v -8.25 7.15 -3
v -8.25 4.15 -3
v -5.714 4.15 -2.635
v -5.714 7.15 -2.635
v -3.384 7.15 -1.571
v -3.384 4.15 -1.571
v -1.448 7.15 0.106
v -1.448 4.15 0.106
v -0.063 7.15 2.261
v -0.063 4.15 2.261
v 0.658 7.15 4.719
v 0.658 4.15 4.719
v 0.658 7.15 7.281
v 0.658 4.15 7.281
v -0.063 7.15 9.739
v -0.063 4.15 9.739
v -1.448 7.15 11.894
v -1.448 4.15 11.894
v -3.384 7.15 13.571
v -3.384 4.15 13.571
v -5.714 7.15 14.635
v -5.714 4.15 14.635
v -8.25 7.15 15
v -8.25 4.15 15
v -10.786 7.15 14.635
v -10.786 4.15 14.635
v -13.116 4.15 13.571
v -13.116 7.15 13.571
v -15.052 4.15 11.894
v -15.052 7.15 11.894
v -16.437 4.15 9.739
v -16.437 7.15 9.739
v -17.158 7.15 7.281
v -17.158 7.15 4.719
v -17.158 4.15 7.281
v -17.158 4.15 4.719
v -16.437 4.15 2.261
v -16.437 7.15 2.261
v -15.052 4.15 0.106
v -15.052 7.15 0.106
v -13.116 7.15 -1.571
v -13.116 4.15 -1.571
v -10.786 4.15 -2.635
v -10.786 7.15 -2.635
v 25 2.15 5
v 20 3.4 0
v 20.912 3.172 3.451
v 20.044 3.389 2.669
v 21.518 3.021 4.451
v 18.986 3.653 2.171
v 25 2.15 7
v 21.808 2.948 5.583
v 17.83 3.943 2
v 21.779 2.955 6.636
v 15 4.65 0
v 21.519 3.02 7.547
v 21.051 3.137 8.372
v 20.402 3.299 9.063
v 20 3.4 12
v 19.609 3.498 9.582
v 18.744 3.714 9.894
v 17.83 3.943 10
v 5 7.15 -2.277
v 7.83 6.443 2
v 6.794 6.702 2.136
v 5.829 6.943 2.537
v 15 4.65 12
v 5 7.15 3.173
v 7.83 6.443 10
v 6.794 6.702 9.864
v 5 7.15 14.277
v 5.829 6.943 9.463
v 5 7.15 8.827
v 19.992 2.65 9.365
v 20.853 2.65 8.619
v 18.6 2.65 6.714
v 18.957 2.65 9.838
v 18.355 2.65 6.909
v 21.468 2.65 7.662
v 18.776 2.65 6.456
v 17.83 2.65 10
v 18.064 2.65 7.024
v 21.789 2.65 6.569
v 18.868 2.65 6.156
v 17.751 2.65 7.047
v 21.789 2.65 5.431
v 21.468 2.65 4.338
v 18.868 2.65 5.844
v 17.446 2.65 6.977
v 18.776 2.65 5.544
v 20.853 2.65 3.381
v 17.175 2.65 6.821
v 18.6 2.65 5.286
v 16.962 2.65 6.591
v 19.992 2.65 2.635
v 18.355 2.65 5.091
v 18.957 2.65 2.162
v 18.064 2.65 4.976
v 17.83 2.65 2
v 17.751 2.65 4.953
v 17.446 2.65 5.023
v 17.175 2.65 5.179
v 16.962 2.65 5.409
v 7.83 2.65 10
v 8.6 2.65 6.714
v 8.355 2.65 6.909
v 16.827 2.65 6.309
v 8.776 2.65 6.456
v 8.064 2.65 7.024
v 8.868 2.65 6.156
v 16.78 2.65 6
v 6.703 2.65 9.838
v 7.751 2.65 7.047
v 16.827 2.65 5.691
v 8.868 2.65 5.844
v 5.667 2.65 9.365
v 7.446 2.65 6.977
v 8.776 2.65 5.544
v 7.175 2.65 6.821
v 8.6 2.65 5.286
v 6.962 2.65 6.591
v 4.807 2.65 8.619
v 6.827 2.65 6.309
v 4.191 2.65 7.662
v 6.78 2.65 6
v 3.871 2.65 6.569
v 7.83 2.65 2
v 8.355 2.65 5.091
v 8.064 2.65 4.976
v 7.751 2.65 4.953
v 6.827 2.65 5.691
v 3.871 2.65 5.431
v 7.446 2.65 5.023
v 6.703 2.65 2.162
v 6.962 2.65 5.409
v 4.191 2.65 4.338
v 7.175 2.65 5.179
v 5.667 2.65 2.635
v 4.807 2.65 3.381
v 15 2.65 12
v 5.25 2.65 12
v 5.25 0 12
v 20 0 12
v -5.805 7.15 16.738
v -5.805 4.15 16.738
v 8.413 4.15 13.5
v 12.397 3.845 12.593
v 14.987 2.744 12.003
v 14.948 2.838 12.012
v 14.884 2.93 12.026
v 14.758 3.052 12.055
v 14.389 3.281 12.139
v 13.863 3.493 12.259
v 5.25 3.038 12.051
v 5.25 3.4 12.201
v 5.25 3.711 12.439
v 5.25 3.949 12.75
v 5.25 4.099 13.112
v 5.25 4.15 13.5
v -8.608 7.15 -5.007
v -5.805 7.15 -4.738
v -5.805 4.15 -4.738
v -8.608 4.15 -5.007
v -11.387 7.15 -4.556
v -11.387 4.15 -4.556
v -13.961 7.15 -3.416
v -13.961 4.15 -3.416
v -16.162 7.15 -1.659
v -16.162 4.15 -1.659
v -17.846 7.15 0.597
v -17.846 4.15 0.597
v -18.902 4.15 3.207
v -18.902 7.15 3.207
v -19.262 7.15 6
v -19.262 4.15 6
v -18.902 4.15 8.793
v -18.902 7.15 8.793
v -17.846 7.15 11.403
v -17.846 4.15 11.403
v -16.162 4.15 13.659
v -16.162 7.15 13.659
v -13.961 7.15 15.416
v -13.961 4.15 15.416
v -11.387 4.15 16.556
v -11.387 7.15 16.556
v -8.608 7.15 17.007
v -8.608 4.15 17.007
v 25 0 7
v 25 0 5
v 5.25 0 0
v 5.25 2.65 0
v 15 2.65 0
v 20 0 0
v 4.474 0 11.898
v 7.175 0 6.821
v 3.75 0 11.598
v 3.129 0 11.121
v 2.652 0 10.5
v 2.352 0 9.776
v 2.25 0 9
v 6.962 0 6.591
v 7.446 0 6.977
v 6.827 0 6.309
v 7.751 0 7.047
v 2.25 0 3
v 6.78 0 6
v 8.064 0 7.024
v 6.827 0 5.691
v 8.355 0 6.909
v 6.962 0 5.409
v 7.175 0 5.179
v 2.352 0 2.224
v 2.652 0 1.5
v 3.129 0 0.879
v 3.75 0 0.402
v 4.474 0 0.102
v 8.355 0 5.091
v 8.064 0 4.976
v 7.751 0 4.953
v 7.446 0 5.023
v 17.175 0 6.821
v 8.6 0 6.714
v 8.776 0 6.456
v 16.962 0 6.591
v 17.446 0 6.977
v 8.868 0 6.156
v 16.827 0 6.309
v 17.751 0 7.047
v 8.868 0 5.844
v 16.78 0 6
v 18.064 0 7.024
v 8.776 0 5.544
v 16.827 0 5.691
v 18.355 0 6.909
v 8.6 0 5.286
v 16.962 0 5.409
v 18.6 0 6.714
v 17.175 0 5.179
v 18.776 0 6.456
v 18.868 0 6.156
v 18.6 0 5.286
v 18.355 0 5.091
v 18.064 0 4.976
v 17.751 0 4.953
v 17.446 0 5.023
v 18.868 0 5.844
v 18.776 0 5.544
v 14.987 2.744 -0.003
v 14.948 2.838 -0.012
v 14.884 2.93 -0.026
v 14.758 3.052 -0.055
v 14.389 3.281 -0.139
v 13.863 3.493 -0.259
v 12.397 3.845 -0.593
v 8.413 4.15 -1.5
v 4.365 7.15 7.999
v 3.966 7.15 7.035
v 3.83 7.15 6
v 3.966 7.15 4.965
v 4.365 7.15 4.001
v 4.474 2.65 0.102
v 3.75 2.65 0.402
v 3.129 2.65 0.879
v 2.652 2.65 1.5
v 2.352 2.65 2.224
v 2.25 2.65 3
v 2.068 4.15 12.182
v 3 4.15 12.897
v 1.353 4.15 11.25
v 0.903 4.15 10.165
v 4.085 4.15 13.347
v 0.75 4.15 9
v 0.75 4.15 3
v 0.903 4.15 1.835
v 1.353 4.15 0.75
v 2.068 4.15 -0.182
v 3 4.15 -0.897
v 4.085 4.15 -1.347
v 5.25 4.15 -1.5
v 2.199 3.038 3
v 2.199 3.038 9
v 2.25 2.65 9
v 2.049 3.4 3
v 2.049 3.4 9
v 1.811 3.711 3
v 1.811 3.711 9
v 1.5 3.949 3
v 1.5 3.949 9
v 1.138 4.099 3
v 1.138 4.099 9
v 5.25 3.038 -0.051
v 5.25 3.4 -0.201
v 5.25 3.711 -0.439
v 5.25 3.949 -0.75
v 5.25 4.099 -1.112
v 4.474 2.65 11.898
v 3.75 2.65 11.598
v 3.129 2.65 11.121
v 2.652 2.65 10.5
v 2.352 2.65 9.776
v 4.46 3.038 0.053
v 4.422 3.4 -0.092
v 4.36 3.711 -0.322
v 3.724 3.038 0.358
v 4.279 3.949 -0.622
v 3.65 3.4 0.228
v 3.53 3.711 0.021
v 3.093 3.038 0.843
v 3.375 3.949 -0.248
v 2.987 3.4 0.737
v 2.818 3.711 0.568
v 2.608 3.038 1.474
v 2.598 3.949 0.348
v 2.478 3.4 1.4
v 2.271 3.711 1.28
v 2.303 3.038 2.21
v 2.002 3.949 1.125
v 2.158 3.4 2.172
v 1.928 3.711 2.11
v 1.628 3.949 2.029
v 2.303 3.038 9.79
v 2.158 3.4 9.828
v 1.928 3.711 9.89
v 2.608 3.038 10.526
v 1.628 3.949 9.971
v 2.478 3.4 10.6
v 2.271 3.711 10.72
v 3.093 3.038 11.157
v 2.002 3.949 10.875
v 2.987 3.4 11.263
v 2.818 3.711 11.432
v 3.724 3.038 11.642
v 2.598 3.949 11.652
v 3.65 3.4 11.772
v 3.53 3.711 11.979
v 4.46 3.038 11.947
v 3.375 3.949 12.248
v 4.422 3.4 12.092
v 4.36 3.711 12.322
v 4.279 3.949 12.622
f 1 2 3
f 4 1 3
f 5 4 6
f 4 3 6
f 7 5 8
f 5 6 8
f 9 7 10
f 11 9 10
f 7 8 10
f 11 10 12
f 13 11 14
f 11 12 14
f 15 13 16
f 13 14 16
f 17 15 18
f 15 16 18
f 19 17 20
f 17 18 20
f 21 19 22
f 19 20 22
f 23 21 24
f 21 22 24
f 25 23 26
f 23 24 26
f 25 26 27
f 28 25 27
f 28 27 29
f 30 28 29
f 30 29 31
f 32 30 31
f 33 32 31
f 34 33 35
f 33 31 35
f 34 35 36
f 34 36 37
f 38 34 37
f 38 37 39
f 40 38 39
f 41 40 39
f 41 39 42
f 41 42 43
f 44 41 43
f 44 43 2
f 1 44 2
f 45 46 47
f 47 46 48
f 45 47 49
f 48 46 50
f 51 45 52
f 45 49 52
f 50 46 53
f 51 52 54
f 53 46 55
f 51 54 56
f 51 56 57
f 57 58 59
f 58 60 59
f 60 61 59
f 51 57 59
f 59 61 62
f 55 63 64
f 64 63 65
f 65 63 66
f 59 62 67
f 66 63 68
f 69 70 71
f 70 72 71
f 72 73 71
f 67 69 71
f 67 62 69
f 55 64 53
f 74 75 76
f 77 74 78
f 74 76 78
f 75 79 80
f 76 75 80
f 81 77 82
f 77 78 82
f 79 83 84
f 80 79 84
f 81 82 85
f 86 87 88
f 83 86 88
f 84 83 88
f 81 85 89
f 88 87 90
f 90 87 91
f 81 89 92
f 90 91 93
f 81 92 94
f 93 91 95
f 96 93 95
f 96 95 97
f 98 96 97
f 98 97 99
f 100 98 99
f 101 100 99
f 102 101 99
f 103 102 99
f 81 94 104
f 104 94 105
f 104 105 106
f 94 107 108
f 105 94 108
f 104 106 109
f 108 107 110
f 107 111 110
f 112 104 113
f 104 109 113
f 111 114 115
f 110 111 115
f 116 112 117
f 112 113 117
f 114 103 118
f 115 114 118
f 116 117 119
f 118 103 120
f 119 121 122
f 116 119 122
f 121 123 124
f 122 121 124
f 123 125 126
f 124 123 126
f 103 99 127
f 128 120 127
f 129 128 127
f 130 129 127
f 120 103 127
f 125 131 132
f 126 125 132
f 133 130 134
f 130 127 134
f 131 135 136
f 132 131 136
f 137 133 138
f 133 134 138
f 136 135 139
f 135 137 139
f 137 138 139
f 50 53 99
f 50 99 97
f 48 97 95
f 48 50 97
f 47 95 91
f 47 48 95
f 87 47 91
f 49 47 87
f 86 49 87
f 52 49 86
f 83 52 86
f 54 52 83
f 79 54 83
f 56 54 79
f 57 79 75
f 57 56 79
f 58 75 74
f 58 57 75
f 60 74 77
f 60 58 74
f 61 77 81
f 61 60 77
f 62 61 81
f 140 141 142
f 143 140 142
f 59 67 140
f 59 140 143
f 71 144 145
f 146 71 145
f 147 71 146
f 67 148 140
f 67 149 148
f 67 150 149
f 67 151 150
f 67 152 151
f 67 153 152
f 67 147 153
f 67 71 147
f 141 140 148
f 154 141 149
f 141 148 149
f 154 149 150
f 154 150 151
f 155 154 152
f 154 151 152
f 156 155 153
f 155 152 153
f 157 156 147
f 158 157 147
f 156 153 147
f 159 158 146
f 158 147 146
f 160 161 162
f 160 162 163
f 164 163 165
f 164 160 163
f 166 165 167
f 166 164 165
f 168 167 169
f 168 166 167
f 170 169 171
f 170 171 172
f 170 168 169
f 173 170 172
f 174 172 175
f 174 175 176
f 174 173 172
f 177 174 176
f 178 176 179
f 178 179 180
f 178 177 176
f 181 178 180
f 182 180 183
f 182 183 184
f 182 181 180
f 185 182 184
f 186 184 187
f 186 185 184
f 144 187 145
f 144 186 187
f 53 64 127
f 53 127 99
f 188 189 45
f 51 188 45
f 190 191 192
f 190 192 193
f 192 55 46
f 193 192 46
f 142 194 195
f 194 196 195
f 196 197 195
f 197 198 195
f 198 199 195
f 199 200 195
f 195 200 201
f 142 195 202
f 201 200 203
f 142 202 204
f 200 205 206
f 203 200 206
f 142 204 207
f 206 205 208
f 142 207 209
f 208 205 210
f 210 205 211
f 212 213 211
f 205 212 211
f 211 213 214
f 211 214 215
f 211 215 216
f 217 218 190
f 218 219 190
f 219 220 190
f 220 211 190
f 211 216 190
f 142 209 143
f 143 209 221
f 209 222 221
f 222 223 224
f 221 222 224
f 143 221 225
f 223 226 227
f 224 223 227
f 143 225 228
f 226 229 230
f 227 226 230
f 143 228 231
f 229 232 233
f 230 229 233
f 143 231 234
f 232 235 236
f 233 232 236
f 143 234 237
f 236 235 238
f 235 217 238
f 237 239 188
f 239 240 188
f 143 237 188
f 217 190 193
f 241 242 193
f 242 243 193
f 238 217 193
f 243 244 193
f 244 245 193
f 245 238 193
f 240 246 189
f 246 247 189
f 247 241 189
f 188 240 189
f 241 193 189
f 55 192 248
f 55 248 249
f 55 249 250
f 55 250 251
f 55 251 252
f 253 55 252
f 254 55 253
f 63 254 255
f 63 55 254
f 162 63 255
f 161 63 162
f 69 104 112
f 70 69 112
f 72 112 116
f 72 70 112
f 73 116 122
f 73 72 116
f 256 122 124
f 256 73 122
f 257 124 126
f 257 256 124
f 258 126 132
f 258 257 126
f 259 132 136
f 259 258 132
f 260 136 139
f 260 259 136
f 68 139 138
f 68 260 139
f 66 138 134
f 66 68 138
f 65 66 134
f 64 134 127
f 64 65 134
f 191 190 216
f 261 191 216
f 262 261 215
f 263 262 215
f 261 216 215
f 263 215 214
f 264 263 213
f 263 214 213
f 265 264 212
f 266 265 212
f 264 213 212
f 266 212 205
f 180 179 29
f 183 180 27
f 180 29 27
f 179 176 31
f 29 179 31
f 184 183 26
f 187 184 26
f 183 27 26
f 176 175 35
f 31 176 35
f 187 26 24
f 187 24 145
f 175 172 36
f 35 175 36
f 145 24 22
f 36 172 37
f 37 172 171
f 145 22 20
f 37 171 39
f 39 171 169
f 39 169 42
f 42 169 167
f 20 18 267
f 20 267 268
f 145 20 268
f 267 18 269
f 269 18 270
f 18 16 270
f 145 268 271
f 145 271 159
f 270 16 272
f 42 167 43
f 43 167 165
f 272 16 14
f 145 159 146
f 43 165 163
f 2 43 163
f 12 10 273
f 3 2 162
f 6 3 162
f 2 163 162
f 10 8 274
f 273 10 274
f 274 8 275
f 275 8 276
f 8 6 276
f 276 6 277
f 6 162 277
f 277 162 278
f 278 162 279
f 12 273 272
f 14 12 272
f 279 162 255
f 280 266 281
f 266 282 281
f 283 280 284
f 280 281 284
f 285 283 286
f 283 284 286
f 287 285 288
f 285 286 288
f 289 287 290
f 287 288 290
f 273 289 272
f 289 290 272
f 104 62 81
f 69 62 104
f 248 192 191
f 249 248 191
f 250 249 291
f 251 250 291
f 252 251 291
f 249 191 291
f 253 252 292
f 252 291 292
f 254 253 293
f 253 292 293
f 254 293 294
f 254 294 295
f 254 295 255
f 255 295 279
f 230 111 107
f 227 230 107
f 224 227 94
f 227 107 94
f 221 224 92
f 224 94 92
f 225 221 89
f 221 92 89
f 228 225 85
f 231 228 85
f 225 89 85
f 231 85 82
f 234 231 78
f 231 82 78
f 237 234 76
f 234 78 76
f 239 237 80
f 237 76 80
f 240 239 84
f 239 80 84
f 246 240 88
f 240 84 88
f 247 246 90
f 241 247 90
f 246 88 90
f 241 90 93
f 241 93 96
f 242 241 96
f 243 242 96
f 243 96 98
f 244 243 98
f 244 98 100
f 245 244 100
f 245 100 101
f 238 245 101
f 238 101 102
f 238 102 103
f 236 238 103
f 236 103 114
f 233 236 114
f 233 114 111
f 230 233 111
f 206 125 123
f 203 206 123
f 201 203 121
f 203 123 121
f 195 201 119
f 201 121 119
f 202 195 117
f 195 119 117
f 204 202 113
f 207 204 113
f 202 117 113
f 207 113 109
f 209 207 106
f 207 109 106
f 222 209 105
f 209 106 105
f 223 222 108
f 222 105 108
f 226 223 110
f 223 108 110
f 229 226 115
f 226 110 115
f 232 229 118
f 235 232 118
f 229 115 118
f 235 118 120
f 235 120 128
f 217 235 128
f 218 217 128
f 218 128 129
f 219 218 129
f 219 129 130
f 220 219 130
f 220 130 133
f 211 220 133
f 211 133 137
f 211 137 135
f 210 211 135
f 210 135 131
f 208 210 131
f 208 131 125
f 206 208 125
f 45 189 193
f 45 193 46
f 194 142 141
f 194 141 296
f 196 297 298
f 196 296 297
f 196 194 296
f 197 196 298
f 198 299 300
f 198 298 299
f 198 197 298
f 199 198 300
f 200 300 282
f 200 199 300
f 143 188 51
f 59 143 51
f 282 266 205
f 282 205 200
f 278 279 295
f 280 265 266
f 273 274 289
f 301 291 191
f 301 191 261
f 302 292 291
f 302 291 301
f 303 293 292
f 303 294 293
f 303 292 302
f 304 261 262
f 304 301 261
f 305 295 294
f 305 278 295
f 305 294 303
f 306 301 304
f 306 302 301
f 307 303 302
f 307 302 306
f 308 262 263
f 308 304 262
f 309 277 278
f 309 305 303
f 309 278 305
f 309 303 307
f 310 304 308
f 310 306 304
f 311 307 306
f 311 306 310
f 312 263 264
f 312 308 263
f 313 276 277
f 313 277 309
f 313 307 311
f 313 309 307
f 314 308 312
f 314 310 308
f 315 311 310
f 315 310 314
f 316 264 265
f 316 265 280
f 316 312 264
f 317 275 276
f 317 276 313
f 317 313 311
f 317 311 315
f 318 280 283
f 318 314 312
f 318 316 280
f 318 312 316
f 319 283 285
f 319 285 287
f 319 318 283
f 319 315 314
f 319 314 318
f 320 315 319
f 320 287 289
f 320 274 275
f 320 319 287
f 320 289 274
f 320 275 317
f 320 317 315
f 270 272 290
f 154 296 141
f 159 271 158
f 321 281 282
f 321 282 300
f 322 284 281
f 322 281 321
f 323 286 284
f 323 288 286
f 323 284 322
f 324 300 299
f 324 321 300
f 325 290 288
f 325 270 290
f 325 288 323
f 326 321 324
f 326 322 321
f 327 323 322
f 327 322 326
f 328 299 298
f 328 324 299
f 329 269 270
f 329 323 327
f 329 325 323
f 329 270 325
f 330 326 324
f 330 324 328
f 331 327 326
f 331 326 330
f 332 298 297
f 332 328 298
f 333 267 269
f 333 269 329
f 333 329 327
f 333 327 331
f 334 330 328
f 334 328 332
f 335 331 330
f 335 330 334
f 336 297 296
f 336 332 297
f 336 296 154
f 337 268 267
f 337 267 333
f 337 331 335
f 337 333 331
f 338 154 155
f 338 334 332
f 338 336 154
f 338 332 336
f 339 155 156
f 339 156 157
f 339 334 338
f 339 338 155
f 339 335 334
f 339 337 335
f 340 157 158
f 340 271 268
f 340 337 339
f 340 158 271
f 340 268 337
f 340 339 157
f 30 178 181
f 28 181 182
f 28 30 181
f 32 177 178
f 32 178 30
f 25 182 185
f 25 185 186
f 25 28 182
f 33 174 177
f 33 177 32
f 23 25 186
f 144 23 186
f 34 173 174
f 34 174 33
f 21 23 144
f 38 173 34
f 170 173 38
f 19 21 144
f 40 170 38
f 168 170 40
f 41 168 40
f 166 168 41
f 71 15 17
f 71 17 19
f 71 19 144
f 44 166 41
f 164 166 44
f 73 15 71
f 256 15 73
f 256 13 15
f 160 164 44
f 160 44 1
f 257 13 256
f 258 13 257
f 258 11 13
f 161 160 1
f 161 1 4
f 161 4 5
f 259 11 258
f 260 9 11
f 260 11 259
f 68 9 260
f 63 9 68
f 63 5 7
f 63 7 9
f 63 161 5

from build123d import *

# Parameters (mm, degrees)
SKETCH1_W           = 25
SKETCH1_H           = 7.15
BOSS_EXTRUDE1_DEPTH = 12
BOSS_EXTRUDE2_DEPTH = 3
CUT_EXTRUDE1_DEPTH  = 21
SKETCH4_R           = 9
CUT_EXTRUDE2_DEPTH  = 10
CHAMFER1_SIZE       = 5
CHAMFER1_SIZE2      = 20
CHAMFER2_SIZE       = 5
SKETCH6_R           = 1.05
CUT_EXTRUDE3_DEPTH  = 10
CUT_EXTRUDE4_DEPTH  = 4.5
FILLET1_R           = 3
FILLET2_R           = 1.5


with BuildPart() as part:
    # Sketch1 → Boss-Extrude1 (new body)
    with BuildSketch(Plane.XY):
        with Locations((12.5, 3.575)):
            Rectangle(SKETCH1_W, SKETCH1_H)
    extrude(amount=BOSS_EXTRUDE1_DEPTH)

    # Sketch2 → Boss-Extrude2 (add)
    with BuildSketch(Plane(origin=(0, 7.15, 0), x_dir=(1, 0, 0), z_dir=(0, 1, 0))):
        with BuildLine():
            Line((15, -12), (15, -6))
            Line((15, -6), (15, 0))
            Line((15, 0), (-5.804949202, 4.737516245))
            ThreePointArc((-5.804949202, 4.737516245), (-19.262380692, -6), (-5.804949202, -16.737516245))
            Line((-5.804949202, -16.737516245), (15, -12))
        make_face()
    extrude(amount=-BOSS_EXTRUDE2_DEPTH)

    # Sketch3 → Cut-Extrude1 (cut)
    with BuildSketch(Plane.XZ.offset(-4.15)):
        Polygon((2.25, 6), (2.25, 12), (0, 12), (0, 0), (2.25, 0), align=None)
    extrude(amount=CUT_EXTRUDE1_DEPTH, mode=Mode.SUBTRACT)

    # Sketch4 → Cut-Extrude2 (cut)
    with BuildSketch(Plane.XZ.offset(-4.15)):
        with Locations(Location((-8.25, 6, 0), (0, 0, 270))):
            Circle(SKETCH4_R)
    extrude(amount=-CUT_EXTRUDE2_DEPTH, mode=Mode.SUBTRACT)

    # Chamfer1
    chamfer1_edges = [part.edges().sort_by_distance(p)[0] for p in [
        (25, 7.15, 6),
    ]]
    chamfer1_side = [part.faces().sort_by_distance(p)[0] for p in [
        (25, 3.575, 6),
    ]]
    chamfer(chamfer1_edges, length=CHAMFER1_SIZE, length2=CHAMFER1_SIZE2, reference=chamfer1_side[0])

    # Chamfer2
    chamfer2_edges = [part.edges().sort_by_distance(p)[0] for p in [
        (25, 1.075, 0),
        (25, 1.075, 12),
    ]]
    chamfer(chamfer2_edges, length=CHAMFER2_SIZE)

    # Sketch6 → Cut-Extrude3 (cut)
    with BuildSketch(Plane(origin=(0, 7.15, 0), x_dir=(1, 0, 0), z_dir=(0, 1, 0))):
        with Locations(Location((7.829893366, -6, 0), (0, 0, 180))):
            Circle(SKETCH6_R)
        with Locations(Location((17.829893366, -6, 0), (0, 0, 180))):
            Circle(SKETCH6_R)
    extrude(amount=-CUT_EXTRUDE3_DEPTH, mode=Mode.SUBTRACT)

    # Sketch7 → Cut-Extrude4 (cut)
    with BuildSketch(Plane(origin=(0, 7.15, 0), x_dir=(1, 0, 0), z_dir=(0, 1, 0))):
        with BuildLine():
            Line((7.829893366, -2), (17.829893366, -2))
            ThreePointArc((17.829893366, -2), (21.829893366, -6), (17.829893366, -10))
            Line((17.829893366, -10), (7.829893366, -10))
            ThreePointArc((7.829893366, -10), (3.829893366, -6), (7.829893366, -2))
        make_face()
    extrude(amount=-CUT_EXTRUDE4_DEPTH, mode=Mode.SUBTRACT)

    # Fillet1
    fillet1_edges = [part.edges().sort_by_distance(p)[0] for p in [
        (2.25, 2.075, 0),
        (2.25, 2.075, 12),
    ]]
    fillet(fillet1_edges, radius=FILLET1_R)

    # Fillet2
    fillet2_edges = [part.edges().sort_by_distance(p)[0] for p in [
        (10.125, 4.15, 0),
        (3.128679656, 4.15, 0.878679656),
        (2.25, 4.15, 6),
        (3.128679656, 4.15, 11.121320344),
        (10.125, 4.15, 12),
    ]]
    fillet(fillet2_edges, radius=FILLET2_R)


solid = part.part
